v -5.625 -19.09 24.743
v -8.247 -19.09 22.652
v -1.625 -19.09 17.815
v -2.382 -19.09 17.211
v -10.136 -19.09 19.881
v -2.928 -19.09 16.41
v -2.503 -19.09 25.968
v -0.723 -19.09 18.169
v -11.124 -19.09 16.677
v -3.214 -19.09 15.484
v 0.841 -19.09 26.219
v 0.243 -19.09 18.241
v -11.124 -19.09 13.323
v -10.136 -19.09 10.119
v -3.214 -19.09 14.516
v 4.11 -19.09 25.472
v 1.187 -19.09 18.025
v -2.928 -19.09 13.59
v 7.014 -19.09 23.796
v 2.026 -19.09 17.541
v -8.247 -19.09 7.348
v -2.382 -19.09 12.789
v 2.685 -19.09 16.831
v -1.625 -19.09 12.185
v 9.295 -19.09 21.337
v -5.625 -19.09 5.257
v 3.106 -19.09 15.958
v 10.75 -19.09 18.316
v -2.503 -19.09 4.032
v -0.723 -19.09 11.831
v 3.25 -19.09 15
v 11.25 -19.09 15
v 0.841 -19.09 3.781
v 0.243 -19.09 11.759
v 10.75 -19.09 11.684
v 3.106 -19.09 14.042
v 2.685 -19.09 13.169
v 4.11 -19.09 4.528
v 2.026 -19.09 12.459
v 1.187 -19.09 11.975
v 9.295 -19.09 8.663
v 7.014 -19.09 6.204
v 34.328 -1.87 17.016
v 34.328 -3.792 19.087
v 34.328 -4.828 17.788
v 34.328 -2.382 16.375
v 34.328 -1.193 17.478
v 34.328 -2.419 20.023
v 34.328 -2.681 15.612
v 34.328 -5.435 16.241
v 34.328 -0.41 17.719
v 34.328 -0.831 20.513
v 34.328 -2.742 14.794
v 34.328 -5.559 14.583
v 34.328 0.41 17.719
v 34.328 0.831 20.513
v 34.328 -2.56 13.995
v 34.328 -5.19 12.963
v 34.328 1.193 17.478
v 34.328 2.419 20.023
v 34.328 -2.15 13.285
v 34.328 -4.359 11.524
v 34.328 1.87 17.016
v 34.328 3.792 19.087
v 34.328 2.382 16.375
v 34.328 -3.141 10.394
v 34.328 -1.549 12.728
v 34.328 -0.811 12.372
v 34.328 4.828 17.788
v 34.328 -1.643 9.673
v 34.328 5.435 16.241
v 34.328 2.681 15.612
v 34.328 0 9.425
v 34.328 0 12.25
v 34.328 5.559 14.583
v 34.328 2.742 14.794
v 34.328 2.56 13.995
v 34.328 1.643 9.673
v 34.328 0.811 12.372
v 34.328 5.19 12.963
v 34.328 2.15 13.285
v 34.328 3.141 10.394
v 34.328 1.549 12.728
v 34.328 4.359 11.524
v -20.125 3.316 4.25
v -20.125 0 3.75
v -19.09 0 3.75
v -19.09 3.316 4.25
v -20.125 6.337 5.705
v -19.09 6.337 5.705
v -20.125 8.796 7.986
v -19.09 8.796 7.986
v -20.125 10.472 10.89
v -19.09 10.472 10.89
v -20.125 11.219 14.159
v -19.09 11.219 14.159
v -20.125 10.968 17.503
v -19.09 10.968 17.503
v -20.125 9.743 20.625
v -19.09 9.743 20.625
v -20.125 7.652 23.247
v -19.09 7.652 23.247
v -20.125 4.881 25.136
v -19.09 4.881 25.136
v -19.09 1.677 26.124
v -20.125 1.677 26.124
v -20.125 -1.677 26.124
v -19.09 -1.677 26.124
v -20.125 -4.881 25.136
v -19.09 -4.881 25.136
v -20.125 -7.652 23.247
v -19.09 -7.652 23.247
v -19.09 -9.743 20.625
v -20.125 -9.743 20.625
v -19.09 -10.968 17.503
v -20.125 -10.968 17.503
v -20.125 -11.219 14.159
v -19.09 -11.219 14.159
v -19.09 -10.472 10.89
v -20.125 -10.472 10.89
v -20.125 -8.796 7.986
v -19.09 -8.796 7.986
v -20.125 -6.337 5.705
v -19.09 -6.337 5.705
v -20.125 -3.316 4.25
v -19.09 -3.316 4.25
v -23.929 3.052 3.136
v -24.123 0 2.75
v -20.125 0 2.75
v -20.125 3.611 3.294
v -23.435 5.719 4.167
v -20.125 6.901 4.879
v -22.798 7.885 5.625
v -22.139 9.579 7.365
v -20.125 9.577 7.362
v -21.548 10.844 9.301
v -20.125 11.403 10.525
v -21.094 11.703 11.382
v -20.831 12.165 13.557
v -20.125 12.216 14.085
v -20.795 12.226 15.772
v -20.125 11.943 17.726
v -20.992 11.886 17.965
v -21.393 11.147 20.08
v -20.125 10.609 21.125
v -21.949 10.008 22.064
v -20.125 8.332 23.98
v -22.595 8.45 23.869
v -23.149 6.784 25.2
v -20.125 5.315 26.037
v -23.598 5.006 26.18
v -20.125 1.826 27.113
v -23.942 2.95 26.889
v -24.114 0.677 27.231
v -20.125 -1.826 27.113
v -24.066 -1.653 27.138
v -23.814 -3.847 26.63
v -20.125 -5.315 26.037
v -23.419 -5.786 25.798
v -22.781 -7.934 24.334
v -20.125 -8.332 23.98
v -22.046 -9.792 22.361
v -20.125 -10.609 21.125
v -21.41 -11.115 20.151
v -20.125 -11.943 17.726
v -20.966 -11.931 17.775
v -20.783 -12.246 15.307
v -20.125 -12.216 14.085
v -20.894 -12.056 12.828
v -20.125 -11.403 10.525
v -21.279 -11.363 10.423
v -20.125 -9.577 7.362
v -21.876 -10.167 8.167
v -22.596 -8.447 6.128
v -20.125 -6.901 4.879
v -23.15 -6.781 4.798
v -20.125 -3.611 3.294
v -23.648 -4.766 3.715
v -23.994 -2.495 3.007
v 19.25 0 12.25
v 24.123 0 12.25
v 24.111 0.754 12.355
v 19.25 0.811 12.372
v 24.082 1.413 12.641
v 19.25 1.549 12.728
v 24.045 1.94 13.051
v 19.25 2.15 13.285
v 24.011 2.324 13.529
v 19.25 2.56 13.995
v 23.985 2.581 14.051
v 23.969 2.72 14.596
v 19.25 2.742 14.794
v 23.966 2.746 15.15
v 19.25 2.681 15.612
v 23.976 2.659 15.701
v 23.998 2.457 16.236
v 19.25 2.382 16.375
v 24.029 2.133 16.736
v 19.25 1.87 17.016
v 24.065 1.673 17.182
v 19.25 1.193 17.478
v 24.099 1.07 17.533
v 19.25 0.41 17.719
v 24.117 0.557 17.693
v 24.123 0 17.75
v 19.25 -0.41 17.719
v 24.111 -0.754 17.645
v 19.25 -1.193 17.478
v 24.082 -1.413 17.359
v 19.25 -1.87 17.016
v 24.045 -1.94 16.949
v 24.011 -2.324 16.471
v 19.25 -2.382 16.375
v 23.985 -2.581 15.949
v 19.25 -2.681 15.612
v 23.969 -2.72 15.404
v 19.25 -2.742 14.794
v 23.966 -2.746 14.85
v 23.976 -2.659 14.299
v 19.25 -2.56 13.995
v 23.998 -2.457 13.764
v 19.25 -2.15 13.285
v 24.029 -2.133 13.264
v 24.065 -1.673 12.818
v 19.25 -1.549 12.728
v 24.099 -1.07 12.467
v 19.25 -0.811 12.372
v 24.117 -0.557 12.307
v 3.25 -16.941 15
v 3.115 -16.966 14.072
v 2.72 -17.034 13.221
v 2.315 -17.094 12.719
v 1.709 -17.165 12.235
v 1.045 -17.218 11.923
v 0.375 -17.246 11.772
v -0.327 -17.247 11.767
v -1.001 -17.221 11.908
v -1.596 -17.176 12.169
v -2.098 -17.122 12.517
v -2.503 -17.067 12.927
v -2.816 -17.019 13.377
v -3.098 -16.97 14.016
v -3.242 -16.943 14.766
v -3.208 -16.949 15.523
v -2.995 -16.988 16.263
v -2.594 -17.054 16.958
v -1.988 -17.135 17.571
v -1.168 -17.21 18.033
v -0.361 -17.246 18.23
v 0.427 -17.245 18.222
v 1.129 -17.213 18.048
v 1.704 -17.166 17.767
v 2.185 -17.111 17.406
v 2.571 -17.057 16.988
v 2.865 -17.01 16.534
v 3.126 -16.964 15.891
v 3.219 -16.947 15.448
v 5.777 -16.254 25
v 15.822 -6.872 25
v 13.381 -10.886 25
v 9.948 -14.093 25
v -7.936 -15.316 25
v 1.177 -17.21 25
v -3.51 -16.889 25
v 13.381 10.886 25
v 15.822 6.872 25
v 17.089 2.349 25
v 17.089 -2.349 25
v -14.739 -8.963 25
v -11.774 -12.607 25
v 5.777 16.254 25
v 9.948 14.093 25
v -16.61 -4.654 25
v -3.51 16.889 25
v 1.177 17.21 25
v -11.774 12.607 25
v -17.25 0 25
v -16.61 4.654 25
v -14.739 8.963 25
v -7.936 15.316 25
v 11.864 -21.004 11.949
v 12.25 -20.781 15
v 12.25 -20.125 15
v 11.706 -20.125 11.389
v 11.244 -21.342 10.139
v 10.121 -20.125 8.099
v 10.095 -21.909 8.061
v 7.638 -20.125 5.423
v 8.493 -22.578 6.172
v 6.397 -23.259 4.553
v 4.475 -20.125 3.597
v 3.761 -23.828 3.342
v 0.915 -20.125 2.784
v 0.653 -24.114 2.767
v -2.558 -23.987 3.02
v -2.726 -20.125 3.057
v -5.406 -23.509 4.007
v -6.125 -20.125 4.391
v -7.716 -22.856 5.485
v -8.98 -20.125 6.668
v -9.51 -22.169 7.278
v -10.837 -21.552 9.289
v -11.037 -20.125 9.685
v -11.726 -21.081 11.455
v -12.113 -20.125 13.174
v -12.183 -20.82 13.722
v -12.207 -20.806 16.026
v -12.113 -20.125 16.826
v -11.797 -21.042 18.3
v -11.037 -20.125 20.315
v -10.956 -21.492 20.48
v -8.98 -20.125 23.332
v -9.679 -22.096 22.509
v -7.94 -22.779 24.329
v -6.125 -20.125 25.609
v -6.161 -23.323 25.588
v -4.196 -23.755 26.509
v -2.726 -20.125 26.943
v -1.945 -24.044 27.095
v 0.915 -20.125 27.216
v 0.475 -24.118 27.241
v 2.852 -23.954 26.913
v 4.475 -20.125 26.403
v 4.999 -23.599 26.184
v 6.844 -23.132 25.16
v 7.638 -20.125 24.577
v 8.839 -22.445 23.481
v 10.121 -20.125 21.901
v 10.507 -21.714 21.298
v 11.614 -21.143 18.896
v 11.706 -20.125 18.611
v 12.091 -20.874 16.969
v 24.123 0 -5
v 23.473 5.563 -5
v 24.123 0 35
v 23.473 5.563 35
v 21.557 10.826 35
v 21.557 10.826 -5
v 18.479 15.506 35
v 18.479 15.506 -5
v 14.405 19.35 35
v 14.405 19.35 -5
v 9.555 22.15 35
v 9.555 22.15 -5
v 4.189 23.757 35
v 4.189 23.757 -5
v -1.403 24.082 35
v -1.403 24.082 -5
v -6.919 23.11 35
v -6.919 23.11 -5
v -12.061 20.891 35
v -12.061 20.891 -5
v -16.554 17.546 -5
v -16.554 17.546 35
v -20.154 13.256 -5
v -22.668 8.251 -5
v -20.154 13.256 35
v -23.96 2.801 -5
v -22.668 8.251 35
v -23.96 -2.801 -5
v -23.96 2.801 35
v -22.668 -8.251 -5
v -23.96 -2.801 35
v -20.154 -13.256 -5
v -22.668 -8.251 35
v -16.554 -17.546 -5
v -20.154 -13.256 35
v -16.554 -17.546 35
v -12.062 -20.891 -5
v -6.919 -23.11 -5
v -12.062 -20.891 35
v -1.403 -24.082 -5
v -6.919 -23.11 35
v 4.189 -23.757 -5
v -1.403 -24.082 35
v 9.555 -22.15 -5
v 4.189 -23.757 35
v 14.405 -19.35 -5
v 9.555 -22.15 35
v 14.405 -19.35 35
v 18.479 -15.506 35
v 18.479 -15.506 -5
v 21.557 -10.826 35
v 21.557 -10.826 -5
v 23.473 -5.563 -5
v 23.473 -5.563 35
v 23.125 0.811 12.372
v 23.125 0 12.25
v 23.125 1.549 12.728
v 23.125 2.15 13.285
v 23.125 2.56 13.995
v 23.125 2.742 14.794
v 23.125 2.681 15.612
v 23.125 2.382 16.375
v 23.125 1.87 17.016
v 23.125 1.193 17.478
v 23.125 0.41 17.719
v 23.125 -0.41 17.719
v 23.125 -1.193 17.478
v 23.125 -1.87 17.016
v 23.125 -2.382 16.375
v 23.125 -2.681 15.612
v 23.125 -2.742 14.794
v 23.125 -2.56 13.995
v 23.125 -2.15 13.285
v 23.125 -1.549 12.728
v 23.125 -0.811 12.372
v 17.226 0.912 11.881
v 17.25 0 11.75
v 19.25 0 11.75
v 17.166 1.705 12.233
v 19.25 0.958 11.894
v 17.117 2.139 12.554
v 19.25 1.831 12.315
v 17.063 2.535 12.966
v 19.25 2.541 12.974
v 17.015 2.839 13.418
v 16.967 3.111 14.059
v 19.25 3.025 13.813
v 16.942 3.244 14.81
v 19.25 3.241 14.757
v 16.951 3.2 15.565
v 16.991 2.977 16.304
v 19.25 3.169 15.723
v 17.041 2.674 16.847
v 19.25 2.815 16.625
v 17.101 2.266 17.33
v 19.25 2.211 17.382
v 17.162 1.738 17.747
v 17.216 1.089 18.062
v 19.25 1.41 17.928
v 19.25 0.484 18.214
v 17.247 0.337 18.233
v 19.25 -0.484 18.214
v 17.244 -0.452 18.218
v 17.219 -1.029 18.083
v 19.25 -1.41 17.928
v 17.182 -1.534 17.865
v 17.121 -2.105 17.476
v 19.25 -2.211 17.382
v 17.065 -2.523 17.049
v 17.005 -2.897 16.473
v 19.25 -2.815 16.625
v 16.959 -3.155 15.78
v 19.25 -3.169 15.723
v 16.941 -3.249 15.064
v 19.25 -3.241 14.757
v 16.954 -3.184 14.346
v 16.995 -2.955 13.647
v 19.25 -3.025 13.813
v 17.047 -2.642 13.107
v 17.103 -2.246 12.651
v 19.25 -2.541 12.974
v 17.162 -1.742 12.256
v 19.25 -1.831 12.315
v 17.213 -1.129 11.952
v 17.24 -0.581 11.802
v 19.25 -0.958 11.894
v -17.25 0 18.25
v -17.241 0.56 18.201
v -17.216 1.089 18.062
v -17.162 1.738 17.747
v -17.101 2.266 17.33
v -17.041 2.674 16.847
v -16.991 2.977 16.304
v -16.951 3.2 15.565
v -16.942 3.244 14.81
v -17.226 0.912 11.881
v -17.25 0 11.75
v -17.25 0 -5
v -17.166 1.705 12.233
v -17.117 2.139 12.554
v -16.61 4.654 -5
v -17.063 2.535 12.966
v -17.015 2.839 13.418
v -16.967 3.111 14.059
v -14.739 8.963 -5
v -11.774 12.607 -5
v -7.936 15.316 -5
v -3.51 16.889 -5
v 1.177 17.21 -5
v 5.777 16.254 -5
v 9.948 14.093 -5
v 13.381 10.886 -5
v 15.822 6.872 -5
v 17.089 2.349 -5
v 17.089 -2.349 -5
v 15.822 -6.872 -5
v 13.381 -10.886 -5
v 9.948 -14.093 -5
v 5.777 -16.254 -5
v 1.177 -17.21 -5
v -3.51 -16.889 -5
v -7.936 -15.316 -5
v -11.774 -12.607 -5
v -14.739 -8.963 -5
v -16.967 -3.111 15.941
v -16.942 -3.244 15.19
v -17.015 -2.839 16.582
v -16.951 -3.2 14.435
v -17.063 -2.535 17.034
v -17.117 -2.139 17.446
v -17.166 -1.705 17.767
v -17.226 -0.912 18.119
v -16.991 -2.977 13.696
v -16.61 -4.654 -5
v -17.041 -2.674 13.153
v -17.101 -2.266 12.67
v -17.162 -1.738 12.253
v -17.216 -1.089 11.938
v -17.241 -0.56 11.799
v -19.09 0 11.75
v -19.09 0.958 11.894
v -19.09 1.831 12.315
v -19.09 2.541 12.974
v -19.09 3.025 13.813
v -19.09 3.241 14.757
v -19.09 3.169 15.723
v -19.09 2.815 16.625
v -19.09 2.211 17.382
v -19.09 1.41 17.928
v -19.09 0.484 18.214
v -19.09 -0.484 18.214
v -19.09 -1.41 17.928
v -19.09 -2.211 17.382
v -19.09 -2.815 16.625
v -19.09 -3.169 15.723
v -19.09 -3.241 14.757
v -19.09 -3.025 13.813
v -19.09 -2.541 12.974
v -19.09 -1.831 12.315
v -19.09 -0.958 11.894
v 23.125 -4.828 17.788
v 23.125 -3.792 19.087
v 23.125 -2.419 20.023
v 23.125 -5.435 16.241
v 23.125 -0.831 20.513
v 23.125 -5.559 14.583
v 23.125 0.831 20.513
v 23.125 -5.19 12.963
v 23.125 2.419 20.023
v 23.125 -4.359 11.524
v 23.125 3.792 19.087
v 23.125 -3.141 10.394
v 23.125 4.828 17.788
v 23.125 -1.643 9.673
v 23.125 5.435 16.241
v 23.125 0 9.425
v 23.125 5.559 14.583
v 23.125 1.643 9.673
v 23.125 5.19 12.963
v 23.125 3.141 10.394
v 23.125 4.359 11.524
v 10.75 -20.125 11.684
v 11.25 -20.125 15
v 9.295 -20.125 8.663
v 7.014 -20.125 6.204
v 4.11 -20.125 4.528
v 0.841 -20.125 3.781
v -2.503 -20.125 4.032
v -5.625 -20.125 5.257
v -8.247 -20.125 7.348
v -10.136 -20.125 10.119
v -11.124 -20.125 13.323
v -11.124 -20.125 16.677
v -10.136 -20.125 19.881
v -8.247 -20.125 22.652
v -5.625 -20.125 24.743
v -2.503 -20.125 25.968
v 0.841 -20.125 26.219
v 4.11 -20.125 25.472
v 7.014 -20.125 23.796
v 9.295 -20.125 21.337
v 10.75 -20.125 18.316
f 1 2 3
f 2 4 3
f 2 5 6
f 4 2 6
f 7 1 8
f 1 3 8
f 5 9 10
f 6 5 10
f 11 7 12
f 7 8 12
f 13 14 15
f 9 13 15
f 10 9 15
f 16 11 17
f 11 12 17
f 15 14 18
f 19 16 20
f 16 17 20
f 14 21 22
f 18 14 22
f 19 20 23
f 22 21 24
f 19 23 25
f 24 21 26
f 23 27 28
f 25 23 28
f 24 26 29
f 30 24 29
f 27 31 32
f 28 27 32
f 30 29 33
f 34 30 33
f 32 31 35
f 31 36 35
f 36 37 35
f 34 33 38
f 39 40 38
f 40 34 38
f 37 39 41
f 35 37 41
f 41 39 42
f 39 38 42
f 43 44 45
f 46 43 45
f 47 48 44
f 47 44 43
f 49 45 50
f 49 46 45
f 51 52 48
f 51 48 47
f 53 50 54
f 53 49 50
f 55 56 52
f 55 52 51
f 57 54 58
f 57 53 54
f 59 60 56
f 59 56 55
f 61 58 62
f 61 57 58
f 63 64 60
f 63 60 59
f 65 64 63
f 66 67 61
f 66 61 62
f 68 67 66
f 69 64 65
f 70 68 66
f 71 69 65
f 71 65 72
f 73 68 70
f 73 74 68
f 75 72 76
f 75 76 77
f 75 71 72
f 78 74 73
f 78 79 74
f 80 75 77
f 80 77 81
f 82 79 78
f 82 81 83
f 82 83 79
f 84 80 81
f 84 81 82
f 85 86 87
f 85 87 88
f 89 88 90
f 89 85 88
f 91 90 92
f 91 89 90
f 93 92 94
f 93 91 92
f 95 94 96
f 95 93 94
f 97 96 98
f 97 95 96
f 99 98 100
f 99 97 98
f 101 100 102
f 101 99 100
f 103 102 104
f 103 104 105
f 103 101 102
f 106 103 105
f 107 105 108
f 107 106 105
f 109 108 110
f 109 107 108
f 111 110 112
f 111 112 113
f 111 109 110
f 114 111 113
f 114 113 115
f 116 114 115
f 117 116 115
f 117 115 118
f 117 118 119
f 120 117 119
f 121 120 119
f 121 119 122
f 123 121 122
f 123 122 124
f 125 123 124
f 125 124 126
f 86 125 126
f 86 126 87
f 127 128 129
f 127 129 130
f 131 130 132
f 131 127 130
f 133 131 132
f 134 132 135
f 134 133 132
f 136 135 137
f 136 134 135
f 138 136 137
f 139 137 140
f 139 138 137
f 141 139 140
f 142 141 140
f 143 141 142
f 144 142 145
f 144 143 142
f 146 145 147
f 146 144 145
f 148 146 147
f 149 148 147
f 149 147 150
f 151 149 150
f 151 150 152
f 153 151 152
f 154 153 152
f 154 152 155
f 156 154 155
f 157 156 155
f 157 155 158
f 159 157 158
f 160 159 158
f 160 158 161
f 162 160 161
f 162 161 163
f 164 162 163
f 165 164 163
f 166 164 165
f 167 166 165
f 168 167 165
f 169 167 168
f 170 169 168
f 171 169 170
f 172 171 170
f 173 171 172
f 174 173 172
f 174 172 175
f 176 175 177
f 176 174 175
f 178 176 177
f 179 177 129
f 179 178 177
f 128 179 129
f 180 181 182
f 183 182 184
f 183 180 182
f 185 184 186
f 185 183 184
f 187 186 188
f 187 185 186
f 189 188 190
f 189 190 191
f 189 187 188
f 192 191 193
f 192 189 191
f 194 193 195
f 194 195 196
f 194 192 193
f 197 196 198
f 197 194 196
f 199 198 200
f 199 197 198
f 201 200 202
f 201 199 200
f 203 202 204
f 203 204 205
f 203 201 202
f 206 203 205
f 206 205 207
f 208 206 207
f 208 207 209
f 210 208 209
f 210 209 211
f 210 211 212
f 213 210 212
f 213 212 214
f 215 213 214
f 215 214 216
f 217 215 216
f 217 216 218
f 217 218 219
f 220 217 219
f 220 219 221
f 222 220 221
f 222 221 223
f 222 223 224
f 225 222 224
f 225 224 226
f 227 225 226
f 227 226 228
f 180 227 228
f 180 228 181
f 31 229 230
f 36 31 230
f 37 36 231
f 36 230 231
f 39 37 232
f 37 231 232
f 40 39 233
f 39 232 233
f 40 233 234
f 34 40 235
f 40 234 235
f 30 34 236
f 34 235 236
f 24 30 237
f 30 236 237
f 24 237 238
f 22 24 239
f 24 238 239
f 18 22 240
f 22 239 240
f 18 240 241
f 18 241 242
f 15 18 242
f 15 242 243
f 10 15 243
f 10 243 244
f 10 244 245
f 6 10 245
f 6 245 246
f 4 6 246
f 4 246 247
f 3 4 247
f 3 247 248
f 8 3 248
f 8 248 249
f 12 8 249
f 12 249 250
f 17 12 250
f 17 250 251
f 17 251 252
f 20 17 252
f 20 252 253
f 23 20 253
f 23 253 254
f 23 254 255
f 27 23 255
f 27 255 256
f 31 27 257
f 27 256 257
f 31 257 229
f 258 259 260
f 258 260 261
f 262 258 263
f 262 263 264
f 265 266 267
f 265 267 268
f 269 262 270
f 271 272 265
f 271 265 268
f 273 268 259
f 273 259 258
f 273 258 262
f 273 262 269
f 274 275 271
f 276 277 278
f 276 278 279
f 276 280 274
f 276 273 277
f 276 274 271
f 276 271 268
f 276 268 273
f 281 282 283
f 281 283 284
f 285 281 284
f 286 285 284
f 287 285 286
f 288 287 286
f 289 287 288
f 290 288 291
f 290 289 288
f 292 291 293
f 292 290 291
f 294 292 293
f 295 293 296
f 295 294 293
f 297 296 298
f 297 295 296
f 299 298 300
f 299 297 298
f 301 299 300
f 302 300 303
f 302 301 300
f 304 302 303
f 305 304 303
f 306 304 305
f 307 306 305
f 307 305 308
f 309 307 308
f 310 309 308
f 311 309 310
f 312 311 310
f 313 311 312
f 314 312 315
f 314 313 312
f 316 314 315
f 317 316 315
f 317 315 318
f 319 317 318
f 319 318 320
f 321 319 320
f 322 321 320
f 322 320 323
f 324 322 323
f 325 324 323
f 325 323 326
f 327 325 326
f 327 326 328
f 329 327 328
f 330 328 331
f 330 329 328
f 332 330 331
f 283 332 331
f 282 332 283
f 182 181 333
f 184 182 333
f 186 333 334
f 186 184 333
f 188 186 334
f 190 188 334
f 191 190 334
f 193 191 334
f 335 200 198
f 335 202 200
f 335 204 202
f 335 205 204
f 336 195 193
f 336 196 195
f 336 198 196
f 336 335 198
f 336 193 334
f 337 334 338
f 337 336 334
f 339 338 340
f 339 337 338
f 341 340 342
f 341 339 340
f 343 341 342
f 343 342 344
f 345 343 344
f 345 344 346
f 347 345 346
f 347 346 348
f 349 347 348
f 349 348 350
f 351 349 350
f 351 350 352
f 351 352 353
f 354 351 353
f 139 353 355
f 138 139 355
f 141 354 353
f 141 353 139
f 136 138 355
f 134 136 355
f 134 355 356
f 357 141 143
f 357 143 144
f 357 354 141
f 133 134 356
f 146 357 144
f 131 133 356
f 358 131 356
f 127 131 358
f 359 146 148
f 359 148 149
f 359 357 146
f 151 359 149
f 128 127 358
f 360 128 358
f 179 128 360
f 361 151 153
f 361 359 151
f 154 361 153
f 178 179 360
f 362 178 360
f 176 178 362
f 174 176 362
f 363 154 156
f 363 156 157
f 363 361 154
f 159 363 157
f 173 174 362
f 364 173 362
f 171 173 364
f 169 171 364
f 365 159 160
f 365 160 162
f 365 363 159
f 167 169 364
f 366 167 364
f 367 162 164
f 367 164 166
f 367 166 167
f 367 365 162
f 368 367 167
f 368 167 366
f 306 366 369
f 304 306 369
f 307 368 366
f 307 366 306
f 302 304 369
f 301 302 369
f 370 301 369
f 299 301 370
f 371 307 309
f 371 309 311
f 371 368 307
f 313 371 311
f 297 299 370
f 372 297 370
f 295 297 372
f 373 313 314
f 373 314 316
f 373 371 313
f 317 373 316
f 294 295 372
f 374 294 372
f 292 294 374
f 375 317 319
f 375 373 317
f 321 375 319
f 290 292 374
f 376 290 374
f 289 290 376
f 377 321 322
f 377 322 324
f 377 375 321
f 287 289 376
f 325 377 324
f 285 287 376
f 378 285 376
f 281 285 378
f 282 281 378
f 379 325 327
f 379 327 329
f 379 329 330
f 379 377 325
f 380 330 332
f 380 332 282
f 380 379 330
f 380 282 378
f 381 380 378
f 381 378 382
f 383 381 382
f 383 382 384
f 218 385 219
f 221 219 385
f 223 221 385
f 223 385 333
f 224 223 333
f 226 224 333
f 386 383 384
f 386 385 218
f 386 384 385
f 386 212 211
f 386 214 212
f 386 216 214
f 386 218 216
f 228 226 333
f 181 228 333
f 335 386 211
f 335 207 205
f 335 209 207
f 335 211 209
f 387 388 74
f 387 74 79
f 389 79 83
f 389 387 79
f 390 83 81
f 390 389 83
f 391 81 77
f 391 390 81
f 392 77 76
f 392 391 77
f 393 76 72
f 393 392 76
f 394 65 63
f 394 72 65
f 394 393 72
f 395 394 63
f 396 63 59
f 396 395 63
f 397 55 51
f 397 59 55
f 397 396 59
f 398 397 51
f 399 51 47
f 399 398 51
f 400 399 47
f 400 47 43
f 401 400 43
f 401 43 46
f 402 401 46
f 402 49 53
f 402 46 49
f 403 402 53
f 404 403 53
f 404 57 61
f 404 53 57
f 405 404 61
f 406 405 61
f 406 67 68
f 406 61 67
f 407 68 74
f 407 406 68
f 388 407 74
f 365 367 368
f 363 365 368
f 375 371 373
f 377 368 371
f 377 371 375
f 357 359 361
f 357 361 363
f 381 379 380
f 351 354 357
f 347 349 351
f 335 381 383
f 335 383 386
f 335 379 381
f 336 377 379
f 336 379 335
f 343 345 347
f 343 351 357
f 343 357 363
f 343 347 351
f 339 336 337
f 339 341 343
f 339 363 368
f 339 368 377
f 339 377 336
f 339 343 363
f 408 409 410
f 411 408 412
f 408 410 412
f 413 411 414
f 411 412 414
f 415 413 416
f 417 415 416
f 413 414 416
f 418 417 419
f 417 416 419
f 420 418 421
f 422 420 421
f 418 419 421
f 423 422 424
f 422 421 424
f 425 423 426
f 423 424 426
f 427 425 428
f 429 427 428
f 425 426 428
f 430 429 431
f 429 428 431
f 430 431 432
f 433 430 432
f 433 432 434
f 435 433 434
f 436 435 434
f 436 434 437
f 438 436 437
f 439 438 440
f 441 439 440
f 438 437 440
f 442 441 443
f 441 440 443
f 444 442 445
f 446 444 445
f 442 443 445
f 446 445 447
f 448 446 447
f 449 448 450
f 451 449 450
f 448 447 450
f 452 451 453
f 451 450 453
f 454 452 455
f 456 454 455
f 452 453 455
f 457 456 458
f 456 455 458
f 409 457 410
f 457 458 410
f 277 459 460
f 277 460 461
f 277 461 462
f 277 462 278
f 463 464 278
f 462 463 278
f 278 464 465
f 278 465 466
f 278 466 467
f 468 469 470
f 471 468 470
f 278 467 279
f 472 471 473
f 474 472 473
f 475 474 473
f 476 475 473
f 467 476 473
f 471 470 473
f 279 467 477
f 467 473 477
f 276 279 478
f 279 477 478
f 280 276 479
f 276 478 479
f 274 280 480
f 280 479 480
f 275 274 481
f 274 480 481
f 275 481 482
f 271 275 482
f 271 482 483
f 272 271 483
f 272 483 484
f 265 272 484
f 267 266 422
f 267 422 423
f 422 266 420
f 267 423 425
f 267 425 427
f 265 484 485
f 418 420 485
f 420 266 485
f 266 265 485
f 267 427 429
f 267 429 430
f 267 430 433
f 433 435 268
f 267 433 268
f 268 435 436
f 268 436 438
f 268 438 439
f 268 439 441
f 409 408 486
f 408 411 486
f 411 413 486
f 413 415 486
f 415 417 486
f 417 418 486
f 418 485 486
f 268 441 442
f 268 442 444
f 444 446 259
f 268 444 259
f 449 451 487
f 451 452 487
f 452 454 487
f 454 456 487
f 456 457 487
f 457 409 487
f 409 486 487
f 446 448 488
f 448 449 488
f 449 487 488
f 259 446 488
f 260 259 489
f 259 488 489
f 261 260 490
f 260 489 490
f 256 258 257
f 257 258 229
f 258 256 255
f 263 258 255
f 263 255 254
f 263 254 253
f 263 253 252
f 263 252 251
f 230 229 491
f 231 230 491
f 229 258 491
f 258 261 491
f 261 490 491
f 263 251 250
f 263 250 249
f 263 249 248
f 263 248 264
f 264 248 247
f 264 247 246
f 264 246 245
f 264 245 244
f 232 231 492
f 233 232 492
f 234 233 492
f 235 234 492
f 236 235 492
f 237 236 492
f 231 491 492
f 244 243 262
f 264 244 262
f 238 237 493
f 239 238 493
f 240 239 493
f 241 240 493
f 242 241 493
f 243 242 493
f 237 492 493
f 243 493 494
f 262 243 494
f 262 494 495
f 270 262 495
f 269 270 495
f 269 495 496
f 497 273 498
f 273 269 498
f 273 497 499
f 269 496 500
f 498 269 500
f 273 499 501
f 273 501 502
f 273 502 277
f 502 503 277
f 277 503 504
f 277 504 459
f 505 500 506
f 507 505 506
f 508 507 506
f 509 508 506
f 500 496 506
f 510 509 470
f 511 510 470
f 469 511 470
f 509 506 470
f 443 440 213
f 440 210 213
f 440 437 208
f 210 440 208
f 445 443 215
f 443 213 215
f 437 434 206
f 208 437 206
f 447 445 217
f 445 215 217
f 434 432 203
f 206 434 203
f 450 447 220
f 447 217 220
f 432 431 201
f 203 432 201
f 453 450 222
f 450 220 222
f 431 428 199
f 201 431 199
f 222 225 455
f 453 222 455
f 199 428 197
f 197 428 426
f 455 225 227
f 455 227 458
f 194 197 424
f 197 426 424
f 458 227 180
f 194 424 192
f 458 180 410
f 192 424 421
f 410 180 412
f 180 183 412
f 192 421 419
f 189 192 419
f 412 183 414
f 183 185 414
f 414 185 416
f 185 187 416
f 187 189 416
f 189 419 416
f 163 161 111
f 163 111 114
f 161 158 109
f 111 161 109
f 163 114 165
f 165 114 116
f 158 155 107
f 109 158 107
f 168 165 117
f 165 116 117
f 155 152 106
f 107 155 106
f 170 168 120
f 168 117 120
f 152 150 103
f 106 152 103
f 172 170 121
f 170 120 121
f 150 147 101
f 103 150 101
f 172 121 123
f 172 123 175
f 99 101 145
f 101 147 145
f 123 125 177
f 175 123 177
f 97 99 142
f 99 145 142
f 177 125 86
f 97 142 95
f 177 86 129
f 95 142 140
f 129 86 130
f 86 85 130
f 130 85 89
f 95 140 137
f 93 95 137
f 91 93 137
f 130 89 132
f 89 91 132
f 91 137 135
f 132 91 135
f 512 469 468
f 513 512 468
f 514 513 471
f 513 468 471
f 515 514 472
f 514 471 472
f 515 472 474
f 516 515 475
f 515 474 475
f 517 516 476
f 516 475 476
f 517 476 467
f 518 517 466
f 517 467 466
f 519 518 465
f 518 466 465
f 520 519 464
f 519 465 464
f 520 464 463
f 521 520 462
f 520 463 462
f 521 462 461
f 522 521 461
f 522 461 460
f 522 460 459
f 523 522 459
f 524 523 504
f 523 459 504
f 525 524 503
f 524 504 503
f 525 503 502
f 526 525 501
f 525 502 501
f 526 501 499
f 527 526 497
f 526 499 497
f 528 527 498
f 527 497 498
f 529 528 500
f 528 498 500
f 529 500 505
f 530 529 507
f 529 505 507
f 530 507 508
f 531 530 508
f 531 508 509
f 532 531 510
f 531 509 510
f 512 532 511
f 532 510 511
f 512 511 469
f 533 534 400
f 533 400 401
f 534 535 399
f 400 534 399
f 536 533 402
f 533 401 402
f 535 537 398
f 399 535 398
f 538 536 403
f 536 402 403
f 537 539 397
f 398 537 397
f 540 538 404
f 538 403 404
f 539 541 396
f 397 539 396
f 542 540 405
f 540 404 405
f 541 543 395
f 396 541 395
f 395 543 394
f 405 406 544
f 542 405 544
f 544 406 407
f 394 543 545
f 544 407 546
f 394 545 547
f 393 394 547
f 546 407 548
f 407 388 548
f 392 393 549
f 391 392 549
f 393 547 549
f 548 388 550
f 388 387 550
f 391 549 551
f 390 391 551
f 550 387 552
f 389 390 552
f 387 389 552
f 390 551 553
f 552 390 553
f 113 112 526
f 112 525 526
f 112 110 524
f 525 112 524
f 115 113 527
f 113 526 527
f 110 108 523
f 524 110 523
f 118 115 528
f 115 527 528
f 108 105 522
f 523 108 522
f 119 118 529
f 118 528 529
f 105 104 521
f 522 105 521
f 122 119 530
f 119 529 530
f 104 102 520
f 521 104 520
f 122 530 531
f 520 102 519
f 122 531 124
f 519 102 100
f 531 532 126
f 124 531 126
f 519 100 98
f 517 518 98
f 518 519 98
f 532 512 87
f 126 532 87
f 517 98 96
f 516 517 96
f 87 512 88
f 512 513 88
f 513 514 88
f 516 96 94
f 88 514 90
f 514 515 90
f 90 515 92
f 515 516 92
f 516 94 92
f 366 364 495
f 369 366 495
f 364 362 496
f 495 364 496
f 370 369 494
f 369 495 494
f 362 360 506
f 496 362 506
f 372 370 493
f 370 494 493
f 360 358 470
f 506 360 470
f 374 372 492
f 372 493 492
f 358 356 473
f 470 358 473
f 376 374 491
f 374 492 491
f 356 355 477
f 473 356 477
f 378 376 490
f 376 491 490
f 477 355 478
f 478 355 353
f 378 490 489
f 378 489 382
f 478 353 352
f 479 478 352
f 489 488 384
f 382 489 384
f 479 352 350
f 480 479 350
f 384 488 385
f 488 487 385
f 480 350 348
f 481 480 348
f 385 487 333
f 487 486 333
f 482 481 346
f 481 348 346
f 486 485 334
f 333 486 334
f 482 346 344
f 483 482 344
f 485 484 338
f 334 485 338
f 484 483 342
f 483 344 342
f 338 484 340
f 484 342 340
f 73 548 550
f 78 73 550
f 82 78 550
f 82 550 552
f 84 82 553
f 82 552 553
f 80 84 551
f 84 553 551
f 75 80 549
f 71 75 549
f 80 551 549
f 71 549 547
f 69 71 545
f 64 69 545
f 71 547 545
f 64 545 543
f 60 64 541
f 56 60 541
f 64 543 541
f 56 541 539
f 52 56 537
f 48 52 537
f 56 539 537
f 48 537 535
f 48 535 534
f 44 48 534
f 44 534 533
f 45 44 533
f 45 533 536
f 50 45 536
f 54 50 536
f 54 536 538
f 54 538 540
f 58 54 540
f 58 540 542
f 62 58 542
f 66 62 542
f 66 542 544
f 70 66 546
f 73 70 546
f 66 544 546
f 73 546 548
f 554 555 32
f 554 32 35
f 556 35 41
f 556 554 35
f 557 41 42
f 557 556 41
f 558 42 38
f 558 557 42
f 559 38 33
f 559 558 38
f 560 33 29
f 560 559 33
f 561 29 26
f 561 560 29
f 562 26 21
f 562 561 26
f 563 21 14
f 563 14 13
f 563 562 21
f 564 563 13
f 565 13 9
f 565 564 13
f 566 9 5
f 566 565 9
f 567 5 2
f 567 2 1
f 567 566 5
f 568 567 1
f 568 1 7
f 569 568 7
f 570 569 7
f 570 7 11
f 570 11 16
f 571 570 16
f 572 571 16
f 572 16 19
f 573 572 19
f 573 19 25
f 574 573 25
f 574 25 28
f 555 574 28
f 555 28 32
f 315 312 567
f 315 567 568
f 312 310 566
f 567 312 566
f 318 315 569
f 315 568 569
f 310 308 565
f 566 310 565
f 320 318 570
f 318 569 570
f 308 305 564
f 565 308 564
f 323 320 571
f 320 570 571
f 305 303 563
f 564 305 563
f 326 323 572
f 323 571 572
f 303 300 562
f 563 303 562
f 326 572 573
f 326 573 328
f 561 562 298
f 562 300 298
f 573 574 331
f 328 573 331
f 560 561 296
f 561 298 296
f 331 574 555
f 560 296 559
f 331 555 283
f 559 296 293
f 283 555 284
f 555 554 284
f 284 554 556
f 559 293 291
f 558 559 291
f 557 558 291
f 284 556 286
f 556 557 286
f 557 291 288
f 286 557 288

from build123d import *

# Parameters (mm, degrees)
SKETCH1_R                = 24.123
BOSS_EXTRUDE1_DEPTH      = 35
BOSS_EXTRUDE1_DEPTH_BACK = 5
SKETCH2_R                = 3.25
CUT_EXTRUDE2_DEPTH       = 19.25
CUT_EXTRUDE2_DEPTH_BACK  = 50
SKETCH4_R                = 3.25
CUT_EXTRUDE3_DEPTH       = 200
CUT_EXTRUDE8_START       = -24.123
SKETCH5_R                = 11.25
CUT_EXTRUDE8_DEPTH       = 5.033
CUT_EXTRUDE9_START       = -24.123
SKETCH6_R                = 11.25
CUT_EXTRUDE9_DEPTH       = 5.033
SKETCH7_R                = 17.25
CUT_EXTRUDE10_DEPTH      = 30
CUT_EXTRUDE11_START      = 19.25
SKETCH8_R                = 2.75
CUT_EXTRUDE11_DEPTH      = 24.873
BOSS_EXTRUDE2_START      = 23.125
SKETCH9_R                = 5.575
BOSS_EXTRUDE2_DEPTH      = 11.203
CUT_EXTRUDE12_DEPTH      = 50
CUT_EXTRUDE13_START      = -24.125
SKETCH10_R               = 12.25
CUT_EXTRUDE13_DEPTH      = 4
CUT_EXTRUDE14_START      = -24.125
SKETCH11_R               = 12.25
CUT_EXTRUDE14_DEPTH      = 4


with BuildPart() as part:
    # Sketch1 → Boss-Extrude1 (new body, two sides)
    with BuildSketch(Plane.XY) as boss_extrude1_sk:
        Circle(SKETCH1_R)
    extrude(amount=BOSS_EXTRUDE1_DEPTH)
    extrude(boss_extrude1_sk.sketch, amount=-BOSS_EXTRUDE1_DEPTH_BACK)

    # Sketch2 → Cut-Extrude2 (cut, two sides)
    with BuildSketch(Plane(origin=(0, 0, 0), x_dir=(0, 0, -1), z_dir=(1, 0, 0))) as cut_extrude2_sk:
        with Locations((-15, 0)):
            Circle(SKETCH2_R)
    extrude(amount=CUT_EXTRUDE2_DEPTH, mode=Mode.SUBTRACT)
    extrude(cut_extrude2_sk.sketch, amount=-CUT_EXTRUDE2_DEPTH_BACK, mode=Mode.SUBTRACT)

    # Sketch4 → Cut-Extrude3 (cut)
    with BuildSketch(Plane(origin=(0, 0, 0), x_dir=(1, 0, 0), z_dir=(0, 1, 0))):
        with Locations((0, -15)):
            Circle(SKETCH4_R)
    extrude(amount=-CUT_EXTRUDE3_DEPTH, mode=Mode.SUBTRACT)

    # Sketch5 → Cut-Extrude8 (cut)
    with BuildSketch(Plane(origin=(0, 0, 0), x_dir=(0, 0, -1), z_dir=(1, 0, 0)).offset(CUT_EXTRUDE8_START)):
        with Locations((-15, 0)):
            Circle(SKETCH5_R)
    extrude(amount=CUT_EXTRUDE8_DEPTH, mode=Mode.SUBTRACT)

    # Sketch6 → Cut-Extrude9 (cut)
    with BuildSketch(Plane(origin=(0, 0, 0), x_dir=(1, 0, 0), z_dir=(0, 1, 0)).offset(CUT_EXTRUDE9_START)):
        with Locations((0, -15)):
            Circle(SKETCH6_R)
    extrude(amount=CUT_EXTRUDE9_DEPTH, mode=Mode.SUBTRACT)

    # Sketch7 → Cut-Extrude10 (cut)
    with BuildSketch(Plane(origin=(0, 0, -5), x_dir=(-1, 0, 0), z_dir=(0, 0, -1))):
        Circle(SKETCH7_R)
    extrude(amount=-CUT_EXTRUDE10_DEPTH, mode=Mode.SUBTRACT)

    # Sketch8 → Cut-Extrude11 (cut)
    with BuildSketch(Plane(origin=(0, 0, 0), x_dir=(0, 0, -1), z_dir=(1, 0, 0)).offset(CUT_EXTRUDE11_START)):
        with Locations((-15, 0)):
            Circle(SKETCH8_R)
    extrude(amount=CUT_EXTRUDE11_DEPTH, mode=Mode.SUBTRACT)

    # Sketch10 → Cut-Extrude13 (cut)
    with BuildSketch(Plane(origin=(0, 0, 0), x_dir=(0, 0, -1), z_dir=(1, 0, 0)).offset(CUT_EXTRUDE13_START)):
        with Locations((-15, 0)):
            Circle(SKETCH10_R)
    extrude(amount=CUT_EXTRUDE13_DEPTH, mode=Mode.SUBTRACT)

    # Sketch11 → Cut-Extrude14 (cut)
    with BuildSketch(Plane(origin=(0, 0, 0), x_dir=(1, 0, 0), z_dir=(0, 1, 0)).offset(CUT_EXTRUDE14_START)):
        with Locations((0, -15)):
            Circle(SKETCH11_R)
    extrude(amount=CUT_EXTRUDE14_DEPTH, mode=Mode.SUBTRACT)


with BuildPart() as body_2:
    # Sketch9 → Boss-Extrude2 (new body)
    with BuildSketch(Plane(origin=(0, 0, 0), x_dir=(0, 0, -1), z_dir=(1, 0, 0)).offset(BOSS_EXTRUDE2_START)):
        with Locations((-15, 0)):
            Circle(SKETCH9_R)
    extrude(amount=BOSS_EXTRUDE2_DEPTH)

    # Sketch8 → Cut-Extrude12 (cut)
    with BuildSketch(Plane(origin=(0, 0, 0), x_dir=(0, 0, -1), z_dir=(1, 0, 0))):
        with Locations((-15, 0)):
            Circle(SKETCH8_R)
    extrude(amount=CUT_EXTRUDE12_DEPTH, mode=Mode.SUBTRACT)


solid = Compound([part.part, body_2.part])
